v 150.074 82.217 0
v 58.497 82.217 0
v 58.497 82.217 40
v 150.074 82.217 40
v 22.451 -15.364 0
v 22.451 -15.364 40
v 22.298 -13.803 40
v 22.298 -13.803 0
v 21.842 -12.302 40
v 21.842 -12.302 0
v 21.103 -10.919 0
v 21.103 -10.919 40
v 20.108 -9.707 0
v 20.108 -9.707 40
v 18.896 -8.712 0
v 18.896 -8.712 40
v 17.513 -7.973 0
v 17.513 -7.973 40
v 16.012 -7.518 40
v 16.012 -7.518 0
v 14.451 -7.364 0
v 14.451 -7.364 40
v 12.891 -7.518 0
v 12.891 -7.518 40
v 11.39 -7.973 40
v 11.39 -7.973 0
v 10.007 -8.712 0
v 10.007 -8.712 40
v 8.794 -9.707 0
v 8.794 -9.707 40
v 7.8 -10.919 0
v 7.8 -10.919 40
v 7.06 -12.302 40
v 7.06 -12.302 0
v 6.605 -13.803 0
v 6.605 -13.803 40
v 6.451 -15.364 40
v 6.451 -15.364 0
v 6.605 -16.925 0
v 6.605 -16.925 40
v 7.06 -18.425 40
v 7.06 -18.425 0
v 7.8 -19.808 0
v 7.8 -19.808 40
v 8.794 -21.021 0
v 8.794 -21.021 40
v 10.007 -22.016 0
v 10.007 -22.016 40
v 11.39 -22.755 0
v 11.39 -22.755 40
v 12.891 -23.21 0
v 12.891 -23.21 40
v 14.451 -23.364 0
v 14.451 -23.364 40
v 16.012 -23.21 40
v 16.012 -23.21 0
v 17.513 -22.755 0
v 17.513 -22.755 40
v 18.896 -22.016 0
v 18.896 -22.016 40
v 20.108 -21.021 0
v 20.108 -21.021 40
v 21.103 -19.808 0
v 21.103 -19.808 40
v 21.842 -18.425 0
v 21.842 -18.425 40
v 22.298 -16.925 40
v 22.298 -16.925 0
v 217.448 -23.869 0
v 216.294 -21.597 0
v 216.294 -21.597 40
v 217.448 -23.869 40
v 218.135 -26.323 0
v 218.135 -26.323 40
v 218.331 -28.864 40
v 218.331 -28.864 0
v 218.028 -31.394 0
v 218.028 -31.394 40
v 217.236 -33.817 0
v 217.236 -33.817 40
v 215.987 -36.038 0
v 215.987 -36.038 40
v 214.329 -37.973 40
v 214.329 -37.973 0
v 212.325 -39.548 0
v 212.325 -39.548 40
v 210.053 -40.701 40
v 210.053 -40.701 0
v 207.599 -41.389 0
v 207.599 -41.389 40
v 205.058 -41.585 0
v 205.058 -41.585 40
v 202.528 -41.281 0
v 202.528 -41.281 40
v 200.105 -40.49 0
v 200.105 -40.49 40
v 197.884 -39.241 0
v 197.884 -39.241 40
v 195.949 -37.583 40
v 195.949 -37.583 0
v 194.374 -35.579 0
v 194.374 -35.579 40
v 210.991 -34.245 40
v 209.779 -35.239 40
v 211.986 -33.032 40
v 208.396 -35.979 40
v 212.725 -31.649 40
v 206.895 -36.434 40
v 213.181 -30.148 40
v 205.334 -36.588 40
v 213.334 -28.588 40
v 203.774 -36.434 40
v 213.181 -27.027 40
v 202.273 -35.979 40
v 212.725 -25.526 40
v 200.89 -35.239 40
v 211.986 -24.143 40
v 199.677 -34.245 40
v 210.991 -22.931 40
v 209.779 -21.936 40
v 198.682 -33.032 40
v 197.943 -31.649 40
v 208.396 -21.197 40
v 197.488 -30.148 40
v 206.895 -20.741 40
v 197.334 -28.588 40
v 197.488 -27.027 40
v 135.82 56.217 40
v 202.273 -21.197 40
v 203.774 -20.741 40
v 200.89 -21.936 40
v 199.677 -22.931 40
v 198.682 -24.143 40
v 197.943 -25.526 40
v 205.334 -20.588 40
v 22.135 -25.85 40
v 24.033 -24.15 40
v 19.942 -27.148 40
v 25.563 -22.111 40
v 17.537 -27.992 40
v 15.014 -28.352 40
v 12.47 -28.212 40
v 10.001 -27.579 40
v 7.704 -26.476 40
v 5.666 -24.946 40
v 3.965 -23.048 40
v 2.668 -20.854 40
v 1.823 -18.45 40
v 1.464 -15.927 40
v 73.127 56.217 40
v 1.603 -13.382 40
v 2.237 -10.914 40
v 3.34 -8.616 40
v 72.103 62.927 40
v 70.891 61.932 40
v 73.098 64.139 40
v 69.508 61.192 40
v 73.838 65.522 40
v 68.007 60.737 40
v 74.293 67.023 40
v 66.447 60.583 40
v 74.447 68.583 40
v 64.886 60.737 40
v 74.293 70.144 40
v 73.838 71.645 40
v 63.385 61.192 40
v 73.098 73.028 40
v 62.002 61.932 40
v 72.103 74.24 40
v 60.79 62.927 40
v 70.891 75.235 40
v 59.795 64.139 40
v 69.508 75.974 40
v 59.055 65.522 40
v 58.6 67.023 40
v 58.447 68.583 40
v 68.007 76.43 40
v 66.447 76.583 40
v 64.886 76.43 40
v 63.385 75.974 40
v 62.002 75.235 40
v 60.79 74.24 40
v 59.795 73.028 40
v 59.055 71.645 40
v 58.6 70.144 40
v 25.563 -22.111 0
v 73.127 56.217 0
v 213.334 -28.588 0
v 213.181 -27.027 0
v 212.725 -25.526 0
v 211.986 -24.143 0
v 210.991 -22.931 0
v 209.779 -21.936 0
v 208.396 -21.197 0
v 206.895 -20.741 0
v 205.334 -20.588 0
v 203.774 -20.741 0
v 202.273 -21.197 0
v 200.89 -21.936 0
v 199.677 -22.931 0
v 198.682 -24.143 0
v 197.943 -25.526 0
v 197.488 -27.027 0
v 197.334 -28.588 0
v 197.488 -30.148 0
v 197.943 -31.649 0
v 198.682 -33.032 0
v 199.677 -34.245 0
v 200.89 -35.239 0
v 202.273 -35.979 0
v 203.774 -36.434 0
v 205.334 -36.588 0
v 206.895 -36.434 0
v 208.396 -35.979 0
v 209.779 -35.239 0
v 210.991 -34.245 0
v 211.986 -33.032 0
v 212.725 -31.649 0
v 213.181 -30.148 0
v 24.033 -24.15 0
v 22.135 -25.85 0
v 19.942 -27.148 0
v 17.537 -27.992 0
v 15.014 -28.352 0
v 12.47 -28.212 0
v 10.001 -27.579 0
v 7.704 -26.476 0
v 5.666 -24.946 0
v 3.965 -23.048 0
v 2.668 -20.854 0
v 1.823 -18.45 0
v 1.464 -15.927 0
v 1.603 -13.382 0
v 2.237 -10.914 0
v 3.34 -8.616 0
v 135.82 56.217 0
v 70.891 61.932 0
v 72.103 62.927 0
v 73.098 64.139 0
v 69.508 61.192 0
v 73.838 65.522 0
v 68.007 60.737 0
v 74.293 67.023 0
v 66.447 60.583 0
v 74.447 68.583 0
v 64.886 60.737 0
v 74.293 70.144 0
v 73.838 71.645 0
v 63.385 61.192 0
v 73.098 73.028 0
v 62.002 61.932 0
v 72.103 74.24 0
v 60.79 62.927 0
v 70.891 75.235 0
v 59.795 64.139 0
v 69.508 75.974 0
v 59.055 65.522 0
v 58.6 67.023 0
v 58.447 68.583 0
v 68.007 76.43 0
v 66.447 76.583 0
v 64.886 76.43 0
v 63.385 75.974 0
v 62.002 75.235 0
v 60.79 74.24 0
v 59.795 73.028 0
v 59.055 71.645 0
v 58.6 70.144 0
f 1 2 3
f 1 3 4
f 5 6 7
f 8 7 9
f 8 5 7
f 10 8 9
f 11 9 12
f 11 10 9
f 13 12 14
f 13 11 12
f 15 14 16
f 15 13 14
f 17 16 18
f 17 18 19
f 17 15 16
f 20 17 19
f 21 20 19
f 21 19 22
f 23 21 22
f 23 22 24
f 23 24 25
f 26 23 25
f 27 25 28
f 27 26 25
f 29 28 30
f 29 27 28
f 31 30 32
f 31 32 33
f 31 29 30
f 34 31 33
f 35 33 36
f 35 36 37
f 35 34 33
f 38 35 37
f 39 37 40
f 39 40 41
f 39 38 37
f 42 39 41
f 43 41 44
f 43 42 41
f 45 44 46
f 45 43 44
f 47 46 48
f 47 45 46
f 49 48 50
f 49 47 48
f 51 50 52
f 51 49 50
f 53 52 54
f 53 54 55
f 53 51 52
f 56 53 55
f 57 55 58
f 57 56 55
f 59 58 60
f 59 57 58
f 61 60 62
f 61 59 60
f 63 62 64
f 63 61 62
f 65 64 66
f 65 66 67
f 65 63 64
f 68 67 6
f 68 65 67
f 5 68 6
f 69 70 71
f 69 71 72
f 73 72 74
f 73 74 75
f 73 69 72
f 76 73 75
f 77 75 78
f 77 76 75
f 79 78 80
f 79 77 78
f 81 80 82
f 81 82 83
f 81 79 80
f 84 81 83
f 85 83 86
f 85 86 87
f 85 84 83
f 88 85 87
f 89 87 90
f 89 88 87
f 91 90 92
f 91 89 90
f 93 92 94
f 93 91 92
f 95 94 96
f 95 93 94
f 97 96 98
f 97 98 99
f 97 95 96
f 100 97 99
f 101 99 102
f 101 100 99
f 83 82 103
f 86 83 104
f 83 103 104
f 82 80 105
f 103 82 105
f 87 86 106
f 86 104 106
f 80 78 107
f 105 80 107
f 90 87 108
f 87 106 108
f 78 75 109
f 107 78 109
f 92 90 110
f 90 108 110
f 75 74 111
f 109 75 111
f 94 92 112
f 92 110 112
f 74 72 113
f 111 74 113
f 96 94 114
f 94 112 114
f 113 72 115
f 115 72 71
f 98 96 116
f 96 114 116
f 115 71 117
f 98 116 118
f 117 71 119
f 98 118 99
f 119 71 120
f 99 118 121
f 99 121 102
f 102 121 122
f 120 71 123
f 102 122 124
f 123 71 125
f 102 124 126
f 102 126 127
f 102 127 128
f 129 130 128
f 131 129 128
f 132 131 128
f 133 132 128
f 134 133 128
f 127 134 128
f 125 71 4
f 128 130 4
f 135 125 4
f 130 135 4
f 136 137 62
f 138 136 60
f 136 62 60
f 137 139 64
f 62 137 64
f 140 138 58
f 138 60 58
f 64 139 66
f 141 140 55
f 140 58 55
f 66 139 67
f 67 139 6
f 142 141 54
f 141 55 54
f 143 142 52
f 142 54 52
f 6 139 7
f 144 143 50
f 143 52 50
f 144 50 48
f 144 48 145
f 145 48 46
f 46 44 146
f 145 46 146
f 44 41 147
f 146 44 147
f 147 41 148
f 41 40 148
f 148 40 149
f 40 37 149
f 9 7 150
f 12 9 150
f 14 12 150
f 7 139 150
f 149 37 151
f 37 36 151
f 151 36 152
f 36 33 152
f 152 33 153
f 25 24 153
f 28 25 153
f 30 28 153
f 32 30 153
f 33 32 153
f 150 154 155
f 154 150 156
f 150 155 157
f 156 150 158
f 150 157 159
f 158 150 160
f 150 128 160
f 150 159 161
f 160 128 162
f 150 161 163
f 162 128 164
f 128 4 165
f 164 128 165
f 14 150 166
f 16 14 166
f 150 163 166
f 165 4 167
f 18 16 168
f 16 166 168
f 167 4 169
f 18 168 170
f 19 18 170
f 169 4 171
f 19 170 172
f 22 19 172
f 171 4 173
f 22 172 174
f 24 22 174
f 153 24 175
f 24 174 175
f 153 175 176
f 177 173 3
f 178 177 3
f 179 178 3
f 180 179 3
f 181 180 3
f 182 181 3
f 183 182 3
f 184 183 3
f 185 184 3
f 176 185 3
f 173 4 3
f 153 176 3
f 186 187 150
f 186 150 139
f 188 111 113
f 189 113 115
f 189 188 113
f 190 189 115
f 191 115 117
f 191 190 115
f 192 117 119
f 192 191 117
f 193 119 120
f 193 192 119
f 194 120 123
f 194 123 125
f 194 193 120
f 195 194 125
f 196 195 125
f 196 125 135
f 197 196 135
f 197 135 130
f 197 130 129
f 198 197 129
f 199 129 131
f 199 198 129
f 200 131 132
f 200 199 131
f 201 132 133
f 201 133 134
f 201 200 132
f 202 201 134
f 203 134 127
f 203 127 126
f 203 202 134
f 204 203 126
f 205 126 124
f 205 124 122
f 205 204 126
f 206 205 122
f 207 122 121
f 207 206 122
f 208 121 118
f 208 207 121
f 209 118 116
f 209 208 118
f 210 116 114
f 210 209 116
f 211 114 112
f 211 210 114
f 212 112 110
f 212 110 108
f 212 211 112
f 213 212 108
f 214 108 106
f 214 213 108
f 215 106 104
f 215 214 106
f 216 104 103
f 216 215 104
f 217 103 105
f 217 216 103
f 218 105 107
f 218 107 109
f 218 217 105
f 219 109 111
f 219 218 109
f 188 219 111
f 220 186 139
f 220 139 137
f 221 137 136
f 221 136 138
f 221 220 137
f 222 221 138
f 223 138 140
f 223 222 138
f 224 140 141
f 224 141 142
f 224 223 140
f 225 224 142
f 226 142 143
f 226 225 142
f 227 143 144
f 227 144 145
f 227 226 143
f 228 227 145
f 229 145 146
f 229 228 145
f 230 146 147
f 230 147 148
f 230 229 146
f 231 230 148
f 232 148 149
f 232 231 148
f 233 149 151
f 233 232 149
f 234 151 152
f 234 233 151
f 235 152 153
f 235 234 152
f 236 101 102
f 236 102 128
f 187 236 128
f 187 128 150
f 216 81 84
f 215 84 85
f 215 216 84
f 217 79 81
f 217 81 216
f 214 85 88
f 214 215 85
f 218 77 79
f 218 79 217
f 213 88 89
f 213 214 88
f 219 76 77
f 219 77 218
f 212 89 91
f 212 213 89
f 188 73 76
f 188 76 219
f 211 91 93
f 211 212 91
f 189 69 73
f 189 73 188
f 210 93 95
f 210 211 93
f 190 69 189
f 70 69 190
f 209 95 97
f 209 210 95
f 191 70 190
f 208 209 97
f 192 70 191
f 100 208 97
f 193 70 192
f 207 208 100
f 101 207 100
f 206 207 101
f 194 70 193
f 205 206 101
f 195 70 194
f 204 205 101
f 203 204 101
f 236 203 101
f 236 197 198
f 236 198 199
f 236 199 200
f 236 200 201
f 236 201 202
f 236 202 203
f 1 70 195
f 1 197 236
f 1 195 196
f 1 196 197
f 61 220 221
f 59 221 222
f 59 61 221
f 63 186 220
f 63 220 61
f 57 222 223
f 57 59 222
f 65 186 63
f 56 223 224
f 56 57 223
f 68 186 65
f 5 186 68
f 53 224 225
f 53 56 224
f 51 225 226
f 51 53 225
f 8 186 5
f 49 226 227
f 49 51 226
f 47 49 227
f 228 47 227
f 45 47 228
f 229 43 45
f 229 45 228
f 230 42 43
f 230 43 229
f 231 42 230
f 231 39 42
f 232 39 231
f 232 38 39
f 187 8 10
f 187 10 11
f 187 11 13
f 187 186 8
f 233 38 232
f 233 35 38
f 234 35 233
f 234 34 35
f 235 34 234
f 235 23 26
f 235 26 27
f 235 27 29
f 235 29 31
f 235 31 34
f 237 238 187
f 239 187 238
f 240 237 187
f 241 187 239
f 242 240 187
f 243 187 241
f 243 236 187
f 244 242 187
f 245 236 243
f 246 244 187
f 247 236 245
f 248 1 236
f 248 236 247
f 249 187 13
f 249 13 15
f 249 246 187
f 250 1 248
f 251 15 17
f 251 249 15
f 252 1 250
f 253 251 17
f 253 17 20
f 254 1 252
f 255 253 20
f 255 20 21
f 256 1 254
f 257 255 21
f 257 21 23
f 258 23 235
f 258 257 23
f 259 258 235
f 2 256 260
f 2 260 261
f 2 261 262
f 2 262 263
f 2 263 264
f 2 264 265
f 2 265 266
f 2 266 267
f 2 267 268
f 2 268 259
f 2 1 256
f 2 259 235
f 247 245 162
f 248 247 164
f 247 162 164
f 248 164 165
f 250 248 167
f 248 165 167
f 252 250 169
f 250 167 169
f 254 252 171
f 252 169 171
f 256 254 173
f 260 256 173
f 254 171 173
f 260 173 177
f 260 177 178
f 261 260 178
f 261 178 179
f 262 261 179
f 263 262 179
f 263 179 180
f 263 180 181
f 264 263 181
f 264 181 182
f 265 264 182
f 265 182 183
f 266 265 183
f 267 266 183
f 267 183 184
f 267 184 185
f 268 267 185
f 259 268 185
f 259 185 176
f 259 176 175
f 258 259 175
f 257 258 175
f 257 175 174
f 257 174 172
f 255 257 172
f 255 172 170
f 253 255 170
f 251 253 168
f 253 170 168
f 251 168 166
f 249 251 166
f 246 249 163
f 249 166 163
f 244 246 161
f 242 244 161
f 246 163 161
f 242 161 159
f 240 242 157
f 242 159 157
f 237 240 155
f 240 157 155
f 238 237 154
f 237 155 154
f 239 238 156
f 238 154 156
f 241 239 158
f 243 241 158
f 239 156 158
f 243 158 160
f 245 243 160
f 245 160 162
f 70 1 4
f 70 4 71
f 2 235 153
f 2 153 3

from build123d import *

# Parameters (mm, degrees)
SZKIC1_R                    = 8
DODANIE_WYCI_GNI_CIE1_DEPTH = 40
SZKIC2_R                    = 8
WYTNIJ_WYCI_GNI_CIE2_DEPTH  = 200


with BuildPart() as part:
    # Szkic1 → Dodanie-wyciągnięcie1 (new body)
    with BuildSketch(Plane.XY):
        with BuildLine():
            Line((3.339539238, -8.616464397), (58.496757029, 82.217181769))
            Line((58.496757029, 82.217181769), (150.074280719, 82.217181769))
            Line((150.074280719, 82.217181769), (216.294351194, -21.596573875))
            ThreePointArc((216.294351194, -21.596573875), (212.325412695, -39.547828071), (194.3741585, -35.578889572))
            Line((194.3741585, -35.578889572), (135.819853477, 56.217181769))
            Line((135.819853477, 56.217181769), (73.126827199, 56.217181769))
            Line((73.126827199, 56.217181769), (25.563122599, -22.111365012))
            ThreePointArc((25.563122599, -22.111365012), (7.703880611, -26.475706385), (3.339539238, -8.616464397))
        make_face()
        with Locations((14.451330919, -15.363914704)):
            Circle(SZKIC1_R, mode=Mode.SUBTRACT)
        with Locations((205.334254847, -28.587731723)):
            Circle(SZKIC1_R, mode=Mode.SUBTRACT)
    extrude(amount=DODANIE_WYCI_GNI_CIE1_DEPTH)

    # Szkic2 → Wytnij-wyciągnięcie2 (cut)
    with BuildSketch(Plane.XY.offset(40)):
        with Locations((66.446533252, 68.583395935)):
            Circle(SZKIC2_R)
    extrude(amount=-WYTNIJ_WYCI_GNI_CIE2_DEPTH, mode=Mode.SUBTRACT)


solid = part.part
